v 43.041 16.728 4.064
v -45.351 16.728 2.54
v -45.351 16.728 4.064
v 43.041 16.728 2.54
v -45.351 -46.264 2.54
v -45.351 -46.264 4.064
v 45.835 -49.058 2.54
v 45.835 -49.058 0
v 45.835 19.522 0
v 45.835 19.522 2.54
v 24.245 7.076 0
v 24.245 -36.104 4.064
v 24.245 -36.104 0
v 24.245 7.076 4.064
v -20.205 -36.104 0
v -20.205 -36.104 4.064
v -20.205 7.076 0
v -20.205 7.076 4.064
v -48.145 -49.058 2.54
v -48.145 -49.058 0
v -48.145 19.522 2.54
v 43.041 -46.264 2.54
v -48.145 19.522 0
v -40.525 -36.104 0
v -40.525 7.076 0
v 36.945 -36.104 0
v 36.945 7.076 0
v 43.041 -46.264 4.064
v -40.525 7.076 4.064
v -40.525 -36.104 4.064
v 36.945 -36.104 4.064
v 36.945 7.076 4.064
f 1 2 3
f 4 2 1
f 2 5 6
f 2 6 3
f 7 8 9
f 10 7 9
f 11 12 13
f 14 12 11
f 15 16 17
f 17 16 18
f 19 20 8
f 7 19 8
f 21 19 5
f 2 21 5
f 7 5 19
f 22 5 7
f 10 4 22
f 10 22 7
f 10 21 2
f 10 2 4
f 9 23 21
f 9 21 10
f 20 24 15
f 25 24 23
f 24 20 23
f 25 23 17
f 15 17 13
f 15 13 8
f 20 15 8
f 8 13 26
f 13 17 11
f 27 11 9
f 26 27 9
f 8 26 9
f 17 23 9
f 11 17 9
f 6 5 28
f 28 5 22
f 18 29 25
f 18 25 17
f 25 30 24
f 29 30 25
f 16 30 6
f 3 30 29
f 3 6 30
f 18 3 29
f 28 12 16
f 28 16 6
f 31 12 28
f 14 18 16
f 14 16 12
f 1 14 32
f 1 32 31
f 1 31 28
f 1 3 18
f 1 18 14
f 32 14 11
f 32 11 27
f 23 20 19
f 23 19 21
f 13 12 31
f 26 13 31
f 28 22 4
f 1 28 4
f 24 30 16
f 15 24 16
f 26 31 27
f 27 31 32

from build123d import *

# Parameters (mm, degrees)
F0_W     = 93.98
F0_H     = 68.58
F1_DEPTH = 2.54
F2_W     = 88.392
F2_H     = 62.992
F3_DEPTH = 1.524
F4_W     = 12.7
F4_H     = 43.18
F5_DEPTH = 4.065
F6_W     = 20.32
F6_H     = 43.18
F7_DEPTH = 4.065


# Not quite as in the source:
# - a feature names something its author has since deleted; it is built from what else it names


with BuildPart() as f1:
    # F0 (on Top) → F1 (new body)
    with BuildSketch(Plane.XY):
        with Locations((-1.1547841132, -14.7677313863)):
            Rectangle(F0_W, F0_H)
    extrude(amount=F1_DEPTH)

    # F2 (on face) → F3 (join)
    with BuildSketch(Plane.XY.offset(2.54)):
        with Locations((-1.1547841132, -14.7677313863)):
            Rectangle(F2_W, F2_H)
    extrude(amount=F3_DEPTH)

    # F4 (on face) → F5 (cut, through all)
    with BuildSketch(Plane.XY.offset(4.064)):
        with Locations((30.5952158868, -14.5137313863)):
            Rectangle(F4_W, F4_H)
    extrude(amount=-F5_DEPTH, mode=Mode.SUBTRACT)

    # F6 (on face) → F7 (cut, through all)
    with BuildSketch(Plane.XY.offset(4.064)):
        with Locations((-30.3647841132, -14.5137313863)):
            Rectangle(F6_W, F6_H)
    extrude(amount=-F7_DEPTH, mode=Mode.SUBTRACT)


solid = f1.part
